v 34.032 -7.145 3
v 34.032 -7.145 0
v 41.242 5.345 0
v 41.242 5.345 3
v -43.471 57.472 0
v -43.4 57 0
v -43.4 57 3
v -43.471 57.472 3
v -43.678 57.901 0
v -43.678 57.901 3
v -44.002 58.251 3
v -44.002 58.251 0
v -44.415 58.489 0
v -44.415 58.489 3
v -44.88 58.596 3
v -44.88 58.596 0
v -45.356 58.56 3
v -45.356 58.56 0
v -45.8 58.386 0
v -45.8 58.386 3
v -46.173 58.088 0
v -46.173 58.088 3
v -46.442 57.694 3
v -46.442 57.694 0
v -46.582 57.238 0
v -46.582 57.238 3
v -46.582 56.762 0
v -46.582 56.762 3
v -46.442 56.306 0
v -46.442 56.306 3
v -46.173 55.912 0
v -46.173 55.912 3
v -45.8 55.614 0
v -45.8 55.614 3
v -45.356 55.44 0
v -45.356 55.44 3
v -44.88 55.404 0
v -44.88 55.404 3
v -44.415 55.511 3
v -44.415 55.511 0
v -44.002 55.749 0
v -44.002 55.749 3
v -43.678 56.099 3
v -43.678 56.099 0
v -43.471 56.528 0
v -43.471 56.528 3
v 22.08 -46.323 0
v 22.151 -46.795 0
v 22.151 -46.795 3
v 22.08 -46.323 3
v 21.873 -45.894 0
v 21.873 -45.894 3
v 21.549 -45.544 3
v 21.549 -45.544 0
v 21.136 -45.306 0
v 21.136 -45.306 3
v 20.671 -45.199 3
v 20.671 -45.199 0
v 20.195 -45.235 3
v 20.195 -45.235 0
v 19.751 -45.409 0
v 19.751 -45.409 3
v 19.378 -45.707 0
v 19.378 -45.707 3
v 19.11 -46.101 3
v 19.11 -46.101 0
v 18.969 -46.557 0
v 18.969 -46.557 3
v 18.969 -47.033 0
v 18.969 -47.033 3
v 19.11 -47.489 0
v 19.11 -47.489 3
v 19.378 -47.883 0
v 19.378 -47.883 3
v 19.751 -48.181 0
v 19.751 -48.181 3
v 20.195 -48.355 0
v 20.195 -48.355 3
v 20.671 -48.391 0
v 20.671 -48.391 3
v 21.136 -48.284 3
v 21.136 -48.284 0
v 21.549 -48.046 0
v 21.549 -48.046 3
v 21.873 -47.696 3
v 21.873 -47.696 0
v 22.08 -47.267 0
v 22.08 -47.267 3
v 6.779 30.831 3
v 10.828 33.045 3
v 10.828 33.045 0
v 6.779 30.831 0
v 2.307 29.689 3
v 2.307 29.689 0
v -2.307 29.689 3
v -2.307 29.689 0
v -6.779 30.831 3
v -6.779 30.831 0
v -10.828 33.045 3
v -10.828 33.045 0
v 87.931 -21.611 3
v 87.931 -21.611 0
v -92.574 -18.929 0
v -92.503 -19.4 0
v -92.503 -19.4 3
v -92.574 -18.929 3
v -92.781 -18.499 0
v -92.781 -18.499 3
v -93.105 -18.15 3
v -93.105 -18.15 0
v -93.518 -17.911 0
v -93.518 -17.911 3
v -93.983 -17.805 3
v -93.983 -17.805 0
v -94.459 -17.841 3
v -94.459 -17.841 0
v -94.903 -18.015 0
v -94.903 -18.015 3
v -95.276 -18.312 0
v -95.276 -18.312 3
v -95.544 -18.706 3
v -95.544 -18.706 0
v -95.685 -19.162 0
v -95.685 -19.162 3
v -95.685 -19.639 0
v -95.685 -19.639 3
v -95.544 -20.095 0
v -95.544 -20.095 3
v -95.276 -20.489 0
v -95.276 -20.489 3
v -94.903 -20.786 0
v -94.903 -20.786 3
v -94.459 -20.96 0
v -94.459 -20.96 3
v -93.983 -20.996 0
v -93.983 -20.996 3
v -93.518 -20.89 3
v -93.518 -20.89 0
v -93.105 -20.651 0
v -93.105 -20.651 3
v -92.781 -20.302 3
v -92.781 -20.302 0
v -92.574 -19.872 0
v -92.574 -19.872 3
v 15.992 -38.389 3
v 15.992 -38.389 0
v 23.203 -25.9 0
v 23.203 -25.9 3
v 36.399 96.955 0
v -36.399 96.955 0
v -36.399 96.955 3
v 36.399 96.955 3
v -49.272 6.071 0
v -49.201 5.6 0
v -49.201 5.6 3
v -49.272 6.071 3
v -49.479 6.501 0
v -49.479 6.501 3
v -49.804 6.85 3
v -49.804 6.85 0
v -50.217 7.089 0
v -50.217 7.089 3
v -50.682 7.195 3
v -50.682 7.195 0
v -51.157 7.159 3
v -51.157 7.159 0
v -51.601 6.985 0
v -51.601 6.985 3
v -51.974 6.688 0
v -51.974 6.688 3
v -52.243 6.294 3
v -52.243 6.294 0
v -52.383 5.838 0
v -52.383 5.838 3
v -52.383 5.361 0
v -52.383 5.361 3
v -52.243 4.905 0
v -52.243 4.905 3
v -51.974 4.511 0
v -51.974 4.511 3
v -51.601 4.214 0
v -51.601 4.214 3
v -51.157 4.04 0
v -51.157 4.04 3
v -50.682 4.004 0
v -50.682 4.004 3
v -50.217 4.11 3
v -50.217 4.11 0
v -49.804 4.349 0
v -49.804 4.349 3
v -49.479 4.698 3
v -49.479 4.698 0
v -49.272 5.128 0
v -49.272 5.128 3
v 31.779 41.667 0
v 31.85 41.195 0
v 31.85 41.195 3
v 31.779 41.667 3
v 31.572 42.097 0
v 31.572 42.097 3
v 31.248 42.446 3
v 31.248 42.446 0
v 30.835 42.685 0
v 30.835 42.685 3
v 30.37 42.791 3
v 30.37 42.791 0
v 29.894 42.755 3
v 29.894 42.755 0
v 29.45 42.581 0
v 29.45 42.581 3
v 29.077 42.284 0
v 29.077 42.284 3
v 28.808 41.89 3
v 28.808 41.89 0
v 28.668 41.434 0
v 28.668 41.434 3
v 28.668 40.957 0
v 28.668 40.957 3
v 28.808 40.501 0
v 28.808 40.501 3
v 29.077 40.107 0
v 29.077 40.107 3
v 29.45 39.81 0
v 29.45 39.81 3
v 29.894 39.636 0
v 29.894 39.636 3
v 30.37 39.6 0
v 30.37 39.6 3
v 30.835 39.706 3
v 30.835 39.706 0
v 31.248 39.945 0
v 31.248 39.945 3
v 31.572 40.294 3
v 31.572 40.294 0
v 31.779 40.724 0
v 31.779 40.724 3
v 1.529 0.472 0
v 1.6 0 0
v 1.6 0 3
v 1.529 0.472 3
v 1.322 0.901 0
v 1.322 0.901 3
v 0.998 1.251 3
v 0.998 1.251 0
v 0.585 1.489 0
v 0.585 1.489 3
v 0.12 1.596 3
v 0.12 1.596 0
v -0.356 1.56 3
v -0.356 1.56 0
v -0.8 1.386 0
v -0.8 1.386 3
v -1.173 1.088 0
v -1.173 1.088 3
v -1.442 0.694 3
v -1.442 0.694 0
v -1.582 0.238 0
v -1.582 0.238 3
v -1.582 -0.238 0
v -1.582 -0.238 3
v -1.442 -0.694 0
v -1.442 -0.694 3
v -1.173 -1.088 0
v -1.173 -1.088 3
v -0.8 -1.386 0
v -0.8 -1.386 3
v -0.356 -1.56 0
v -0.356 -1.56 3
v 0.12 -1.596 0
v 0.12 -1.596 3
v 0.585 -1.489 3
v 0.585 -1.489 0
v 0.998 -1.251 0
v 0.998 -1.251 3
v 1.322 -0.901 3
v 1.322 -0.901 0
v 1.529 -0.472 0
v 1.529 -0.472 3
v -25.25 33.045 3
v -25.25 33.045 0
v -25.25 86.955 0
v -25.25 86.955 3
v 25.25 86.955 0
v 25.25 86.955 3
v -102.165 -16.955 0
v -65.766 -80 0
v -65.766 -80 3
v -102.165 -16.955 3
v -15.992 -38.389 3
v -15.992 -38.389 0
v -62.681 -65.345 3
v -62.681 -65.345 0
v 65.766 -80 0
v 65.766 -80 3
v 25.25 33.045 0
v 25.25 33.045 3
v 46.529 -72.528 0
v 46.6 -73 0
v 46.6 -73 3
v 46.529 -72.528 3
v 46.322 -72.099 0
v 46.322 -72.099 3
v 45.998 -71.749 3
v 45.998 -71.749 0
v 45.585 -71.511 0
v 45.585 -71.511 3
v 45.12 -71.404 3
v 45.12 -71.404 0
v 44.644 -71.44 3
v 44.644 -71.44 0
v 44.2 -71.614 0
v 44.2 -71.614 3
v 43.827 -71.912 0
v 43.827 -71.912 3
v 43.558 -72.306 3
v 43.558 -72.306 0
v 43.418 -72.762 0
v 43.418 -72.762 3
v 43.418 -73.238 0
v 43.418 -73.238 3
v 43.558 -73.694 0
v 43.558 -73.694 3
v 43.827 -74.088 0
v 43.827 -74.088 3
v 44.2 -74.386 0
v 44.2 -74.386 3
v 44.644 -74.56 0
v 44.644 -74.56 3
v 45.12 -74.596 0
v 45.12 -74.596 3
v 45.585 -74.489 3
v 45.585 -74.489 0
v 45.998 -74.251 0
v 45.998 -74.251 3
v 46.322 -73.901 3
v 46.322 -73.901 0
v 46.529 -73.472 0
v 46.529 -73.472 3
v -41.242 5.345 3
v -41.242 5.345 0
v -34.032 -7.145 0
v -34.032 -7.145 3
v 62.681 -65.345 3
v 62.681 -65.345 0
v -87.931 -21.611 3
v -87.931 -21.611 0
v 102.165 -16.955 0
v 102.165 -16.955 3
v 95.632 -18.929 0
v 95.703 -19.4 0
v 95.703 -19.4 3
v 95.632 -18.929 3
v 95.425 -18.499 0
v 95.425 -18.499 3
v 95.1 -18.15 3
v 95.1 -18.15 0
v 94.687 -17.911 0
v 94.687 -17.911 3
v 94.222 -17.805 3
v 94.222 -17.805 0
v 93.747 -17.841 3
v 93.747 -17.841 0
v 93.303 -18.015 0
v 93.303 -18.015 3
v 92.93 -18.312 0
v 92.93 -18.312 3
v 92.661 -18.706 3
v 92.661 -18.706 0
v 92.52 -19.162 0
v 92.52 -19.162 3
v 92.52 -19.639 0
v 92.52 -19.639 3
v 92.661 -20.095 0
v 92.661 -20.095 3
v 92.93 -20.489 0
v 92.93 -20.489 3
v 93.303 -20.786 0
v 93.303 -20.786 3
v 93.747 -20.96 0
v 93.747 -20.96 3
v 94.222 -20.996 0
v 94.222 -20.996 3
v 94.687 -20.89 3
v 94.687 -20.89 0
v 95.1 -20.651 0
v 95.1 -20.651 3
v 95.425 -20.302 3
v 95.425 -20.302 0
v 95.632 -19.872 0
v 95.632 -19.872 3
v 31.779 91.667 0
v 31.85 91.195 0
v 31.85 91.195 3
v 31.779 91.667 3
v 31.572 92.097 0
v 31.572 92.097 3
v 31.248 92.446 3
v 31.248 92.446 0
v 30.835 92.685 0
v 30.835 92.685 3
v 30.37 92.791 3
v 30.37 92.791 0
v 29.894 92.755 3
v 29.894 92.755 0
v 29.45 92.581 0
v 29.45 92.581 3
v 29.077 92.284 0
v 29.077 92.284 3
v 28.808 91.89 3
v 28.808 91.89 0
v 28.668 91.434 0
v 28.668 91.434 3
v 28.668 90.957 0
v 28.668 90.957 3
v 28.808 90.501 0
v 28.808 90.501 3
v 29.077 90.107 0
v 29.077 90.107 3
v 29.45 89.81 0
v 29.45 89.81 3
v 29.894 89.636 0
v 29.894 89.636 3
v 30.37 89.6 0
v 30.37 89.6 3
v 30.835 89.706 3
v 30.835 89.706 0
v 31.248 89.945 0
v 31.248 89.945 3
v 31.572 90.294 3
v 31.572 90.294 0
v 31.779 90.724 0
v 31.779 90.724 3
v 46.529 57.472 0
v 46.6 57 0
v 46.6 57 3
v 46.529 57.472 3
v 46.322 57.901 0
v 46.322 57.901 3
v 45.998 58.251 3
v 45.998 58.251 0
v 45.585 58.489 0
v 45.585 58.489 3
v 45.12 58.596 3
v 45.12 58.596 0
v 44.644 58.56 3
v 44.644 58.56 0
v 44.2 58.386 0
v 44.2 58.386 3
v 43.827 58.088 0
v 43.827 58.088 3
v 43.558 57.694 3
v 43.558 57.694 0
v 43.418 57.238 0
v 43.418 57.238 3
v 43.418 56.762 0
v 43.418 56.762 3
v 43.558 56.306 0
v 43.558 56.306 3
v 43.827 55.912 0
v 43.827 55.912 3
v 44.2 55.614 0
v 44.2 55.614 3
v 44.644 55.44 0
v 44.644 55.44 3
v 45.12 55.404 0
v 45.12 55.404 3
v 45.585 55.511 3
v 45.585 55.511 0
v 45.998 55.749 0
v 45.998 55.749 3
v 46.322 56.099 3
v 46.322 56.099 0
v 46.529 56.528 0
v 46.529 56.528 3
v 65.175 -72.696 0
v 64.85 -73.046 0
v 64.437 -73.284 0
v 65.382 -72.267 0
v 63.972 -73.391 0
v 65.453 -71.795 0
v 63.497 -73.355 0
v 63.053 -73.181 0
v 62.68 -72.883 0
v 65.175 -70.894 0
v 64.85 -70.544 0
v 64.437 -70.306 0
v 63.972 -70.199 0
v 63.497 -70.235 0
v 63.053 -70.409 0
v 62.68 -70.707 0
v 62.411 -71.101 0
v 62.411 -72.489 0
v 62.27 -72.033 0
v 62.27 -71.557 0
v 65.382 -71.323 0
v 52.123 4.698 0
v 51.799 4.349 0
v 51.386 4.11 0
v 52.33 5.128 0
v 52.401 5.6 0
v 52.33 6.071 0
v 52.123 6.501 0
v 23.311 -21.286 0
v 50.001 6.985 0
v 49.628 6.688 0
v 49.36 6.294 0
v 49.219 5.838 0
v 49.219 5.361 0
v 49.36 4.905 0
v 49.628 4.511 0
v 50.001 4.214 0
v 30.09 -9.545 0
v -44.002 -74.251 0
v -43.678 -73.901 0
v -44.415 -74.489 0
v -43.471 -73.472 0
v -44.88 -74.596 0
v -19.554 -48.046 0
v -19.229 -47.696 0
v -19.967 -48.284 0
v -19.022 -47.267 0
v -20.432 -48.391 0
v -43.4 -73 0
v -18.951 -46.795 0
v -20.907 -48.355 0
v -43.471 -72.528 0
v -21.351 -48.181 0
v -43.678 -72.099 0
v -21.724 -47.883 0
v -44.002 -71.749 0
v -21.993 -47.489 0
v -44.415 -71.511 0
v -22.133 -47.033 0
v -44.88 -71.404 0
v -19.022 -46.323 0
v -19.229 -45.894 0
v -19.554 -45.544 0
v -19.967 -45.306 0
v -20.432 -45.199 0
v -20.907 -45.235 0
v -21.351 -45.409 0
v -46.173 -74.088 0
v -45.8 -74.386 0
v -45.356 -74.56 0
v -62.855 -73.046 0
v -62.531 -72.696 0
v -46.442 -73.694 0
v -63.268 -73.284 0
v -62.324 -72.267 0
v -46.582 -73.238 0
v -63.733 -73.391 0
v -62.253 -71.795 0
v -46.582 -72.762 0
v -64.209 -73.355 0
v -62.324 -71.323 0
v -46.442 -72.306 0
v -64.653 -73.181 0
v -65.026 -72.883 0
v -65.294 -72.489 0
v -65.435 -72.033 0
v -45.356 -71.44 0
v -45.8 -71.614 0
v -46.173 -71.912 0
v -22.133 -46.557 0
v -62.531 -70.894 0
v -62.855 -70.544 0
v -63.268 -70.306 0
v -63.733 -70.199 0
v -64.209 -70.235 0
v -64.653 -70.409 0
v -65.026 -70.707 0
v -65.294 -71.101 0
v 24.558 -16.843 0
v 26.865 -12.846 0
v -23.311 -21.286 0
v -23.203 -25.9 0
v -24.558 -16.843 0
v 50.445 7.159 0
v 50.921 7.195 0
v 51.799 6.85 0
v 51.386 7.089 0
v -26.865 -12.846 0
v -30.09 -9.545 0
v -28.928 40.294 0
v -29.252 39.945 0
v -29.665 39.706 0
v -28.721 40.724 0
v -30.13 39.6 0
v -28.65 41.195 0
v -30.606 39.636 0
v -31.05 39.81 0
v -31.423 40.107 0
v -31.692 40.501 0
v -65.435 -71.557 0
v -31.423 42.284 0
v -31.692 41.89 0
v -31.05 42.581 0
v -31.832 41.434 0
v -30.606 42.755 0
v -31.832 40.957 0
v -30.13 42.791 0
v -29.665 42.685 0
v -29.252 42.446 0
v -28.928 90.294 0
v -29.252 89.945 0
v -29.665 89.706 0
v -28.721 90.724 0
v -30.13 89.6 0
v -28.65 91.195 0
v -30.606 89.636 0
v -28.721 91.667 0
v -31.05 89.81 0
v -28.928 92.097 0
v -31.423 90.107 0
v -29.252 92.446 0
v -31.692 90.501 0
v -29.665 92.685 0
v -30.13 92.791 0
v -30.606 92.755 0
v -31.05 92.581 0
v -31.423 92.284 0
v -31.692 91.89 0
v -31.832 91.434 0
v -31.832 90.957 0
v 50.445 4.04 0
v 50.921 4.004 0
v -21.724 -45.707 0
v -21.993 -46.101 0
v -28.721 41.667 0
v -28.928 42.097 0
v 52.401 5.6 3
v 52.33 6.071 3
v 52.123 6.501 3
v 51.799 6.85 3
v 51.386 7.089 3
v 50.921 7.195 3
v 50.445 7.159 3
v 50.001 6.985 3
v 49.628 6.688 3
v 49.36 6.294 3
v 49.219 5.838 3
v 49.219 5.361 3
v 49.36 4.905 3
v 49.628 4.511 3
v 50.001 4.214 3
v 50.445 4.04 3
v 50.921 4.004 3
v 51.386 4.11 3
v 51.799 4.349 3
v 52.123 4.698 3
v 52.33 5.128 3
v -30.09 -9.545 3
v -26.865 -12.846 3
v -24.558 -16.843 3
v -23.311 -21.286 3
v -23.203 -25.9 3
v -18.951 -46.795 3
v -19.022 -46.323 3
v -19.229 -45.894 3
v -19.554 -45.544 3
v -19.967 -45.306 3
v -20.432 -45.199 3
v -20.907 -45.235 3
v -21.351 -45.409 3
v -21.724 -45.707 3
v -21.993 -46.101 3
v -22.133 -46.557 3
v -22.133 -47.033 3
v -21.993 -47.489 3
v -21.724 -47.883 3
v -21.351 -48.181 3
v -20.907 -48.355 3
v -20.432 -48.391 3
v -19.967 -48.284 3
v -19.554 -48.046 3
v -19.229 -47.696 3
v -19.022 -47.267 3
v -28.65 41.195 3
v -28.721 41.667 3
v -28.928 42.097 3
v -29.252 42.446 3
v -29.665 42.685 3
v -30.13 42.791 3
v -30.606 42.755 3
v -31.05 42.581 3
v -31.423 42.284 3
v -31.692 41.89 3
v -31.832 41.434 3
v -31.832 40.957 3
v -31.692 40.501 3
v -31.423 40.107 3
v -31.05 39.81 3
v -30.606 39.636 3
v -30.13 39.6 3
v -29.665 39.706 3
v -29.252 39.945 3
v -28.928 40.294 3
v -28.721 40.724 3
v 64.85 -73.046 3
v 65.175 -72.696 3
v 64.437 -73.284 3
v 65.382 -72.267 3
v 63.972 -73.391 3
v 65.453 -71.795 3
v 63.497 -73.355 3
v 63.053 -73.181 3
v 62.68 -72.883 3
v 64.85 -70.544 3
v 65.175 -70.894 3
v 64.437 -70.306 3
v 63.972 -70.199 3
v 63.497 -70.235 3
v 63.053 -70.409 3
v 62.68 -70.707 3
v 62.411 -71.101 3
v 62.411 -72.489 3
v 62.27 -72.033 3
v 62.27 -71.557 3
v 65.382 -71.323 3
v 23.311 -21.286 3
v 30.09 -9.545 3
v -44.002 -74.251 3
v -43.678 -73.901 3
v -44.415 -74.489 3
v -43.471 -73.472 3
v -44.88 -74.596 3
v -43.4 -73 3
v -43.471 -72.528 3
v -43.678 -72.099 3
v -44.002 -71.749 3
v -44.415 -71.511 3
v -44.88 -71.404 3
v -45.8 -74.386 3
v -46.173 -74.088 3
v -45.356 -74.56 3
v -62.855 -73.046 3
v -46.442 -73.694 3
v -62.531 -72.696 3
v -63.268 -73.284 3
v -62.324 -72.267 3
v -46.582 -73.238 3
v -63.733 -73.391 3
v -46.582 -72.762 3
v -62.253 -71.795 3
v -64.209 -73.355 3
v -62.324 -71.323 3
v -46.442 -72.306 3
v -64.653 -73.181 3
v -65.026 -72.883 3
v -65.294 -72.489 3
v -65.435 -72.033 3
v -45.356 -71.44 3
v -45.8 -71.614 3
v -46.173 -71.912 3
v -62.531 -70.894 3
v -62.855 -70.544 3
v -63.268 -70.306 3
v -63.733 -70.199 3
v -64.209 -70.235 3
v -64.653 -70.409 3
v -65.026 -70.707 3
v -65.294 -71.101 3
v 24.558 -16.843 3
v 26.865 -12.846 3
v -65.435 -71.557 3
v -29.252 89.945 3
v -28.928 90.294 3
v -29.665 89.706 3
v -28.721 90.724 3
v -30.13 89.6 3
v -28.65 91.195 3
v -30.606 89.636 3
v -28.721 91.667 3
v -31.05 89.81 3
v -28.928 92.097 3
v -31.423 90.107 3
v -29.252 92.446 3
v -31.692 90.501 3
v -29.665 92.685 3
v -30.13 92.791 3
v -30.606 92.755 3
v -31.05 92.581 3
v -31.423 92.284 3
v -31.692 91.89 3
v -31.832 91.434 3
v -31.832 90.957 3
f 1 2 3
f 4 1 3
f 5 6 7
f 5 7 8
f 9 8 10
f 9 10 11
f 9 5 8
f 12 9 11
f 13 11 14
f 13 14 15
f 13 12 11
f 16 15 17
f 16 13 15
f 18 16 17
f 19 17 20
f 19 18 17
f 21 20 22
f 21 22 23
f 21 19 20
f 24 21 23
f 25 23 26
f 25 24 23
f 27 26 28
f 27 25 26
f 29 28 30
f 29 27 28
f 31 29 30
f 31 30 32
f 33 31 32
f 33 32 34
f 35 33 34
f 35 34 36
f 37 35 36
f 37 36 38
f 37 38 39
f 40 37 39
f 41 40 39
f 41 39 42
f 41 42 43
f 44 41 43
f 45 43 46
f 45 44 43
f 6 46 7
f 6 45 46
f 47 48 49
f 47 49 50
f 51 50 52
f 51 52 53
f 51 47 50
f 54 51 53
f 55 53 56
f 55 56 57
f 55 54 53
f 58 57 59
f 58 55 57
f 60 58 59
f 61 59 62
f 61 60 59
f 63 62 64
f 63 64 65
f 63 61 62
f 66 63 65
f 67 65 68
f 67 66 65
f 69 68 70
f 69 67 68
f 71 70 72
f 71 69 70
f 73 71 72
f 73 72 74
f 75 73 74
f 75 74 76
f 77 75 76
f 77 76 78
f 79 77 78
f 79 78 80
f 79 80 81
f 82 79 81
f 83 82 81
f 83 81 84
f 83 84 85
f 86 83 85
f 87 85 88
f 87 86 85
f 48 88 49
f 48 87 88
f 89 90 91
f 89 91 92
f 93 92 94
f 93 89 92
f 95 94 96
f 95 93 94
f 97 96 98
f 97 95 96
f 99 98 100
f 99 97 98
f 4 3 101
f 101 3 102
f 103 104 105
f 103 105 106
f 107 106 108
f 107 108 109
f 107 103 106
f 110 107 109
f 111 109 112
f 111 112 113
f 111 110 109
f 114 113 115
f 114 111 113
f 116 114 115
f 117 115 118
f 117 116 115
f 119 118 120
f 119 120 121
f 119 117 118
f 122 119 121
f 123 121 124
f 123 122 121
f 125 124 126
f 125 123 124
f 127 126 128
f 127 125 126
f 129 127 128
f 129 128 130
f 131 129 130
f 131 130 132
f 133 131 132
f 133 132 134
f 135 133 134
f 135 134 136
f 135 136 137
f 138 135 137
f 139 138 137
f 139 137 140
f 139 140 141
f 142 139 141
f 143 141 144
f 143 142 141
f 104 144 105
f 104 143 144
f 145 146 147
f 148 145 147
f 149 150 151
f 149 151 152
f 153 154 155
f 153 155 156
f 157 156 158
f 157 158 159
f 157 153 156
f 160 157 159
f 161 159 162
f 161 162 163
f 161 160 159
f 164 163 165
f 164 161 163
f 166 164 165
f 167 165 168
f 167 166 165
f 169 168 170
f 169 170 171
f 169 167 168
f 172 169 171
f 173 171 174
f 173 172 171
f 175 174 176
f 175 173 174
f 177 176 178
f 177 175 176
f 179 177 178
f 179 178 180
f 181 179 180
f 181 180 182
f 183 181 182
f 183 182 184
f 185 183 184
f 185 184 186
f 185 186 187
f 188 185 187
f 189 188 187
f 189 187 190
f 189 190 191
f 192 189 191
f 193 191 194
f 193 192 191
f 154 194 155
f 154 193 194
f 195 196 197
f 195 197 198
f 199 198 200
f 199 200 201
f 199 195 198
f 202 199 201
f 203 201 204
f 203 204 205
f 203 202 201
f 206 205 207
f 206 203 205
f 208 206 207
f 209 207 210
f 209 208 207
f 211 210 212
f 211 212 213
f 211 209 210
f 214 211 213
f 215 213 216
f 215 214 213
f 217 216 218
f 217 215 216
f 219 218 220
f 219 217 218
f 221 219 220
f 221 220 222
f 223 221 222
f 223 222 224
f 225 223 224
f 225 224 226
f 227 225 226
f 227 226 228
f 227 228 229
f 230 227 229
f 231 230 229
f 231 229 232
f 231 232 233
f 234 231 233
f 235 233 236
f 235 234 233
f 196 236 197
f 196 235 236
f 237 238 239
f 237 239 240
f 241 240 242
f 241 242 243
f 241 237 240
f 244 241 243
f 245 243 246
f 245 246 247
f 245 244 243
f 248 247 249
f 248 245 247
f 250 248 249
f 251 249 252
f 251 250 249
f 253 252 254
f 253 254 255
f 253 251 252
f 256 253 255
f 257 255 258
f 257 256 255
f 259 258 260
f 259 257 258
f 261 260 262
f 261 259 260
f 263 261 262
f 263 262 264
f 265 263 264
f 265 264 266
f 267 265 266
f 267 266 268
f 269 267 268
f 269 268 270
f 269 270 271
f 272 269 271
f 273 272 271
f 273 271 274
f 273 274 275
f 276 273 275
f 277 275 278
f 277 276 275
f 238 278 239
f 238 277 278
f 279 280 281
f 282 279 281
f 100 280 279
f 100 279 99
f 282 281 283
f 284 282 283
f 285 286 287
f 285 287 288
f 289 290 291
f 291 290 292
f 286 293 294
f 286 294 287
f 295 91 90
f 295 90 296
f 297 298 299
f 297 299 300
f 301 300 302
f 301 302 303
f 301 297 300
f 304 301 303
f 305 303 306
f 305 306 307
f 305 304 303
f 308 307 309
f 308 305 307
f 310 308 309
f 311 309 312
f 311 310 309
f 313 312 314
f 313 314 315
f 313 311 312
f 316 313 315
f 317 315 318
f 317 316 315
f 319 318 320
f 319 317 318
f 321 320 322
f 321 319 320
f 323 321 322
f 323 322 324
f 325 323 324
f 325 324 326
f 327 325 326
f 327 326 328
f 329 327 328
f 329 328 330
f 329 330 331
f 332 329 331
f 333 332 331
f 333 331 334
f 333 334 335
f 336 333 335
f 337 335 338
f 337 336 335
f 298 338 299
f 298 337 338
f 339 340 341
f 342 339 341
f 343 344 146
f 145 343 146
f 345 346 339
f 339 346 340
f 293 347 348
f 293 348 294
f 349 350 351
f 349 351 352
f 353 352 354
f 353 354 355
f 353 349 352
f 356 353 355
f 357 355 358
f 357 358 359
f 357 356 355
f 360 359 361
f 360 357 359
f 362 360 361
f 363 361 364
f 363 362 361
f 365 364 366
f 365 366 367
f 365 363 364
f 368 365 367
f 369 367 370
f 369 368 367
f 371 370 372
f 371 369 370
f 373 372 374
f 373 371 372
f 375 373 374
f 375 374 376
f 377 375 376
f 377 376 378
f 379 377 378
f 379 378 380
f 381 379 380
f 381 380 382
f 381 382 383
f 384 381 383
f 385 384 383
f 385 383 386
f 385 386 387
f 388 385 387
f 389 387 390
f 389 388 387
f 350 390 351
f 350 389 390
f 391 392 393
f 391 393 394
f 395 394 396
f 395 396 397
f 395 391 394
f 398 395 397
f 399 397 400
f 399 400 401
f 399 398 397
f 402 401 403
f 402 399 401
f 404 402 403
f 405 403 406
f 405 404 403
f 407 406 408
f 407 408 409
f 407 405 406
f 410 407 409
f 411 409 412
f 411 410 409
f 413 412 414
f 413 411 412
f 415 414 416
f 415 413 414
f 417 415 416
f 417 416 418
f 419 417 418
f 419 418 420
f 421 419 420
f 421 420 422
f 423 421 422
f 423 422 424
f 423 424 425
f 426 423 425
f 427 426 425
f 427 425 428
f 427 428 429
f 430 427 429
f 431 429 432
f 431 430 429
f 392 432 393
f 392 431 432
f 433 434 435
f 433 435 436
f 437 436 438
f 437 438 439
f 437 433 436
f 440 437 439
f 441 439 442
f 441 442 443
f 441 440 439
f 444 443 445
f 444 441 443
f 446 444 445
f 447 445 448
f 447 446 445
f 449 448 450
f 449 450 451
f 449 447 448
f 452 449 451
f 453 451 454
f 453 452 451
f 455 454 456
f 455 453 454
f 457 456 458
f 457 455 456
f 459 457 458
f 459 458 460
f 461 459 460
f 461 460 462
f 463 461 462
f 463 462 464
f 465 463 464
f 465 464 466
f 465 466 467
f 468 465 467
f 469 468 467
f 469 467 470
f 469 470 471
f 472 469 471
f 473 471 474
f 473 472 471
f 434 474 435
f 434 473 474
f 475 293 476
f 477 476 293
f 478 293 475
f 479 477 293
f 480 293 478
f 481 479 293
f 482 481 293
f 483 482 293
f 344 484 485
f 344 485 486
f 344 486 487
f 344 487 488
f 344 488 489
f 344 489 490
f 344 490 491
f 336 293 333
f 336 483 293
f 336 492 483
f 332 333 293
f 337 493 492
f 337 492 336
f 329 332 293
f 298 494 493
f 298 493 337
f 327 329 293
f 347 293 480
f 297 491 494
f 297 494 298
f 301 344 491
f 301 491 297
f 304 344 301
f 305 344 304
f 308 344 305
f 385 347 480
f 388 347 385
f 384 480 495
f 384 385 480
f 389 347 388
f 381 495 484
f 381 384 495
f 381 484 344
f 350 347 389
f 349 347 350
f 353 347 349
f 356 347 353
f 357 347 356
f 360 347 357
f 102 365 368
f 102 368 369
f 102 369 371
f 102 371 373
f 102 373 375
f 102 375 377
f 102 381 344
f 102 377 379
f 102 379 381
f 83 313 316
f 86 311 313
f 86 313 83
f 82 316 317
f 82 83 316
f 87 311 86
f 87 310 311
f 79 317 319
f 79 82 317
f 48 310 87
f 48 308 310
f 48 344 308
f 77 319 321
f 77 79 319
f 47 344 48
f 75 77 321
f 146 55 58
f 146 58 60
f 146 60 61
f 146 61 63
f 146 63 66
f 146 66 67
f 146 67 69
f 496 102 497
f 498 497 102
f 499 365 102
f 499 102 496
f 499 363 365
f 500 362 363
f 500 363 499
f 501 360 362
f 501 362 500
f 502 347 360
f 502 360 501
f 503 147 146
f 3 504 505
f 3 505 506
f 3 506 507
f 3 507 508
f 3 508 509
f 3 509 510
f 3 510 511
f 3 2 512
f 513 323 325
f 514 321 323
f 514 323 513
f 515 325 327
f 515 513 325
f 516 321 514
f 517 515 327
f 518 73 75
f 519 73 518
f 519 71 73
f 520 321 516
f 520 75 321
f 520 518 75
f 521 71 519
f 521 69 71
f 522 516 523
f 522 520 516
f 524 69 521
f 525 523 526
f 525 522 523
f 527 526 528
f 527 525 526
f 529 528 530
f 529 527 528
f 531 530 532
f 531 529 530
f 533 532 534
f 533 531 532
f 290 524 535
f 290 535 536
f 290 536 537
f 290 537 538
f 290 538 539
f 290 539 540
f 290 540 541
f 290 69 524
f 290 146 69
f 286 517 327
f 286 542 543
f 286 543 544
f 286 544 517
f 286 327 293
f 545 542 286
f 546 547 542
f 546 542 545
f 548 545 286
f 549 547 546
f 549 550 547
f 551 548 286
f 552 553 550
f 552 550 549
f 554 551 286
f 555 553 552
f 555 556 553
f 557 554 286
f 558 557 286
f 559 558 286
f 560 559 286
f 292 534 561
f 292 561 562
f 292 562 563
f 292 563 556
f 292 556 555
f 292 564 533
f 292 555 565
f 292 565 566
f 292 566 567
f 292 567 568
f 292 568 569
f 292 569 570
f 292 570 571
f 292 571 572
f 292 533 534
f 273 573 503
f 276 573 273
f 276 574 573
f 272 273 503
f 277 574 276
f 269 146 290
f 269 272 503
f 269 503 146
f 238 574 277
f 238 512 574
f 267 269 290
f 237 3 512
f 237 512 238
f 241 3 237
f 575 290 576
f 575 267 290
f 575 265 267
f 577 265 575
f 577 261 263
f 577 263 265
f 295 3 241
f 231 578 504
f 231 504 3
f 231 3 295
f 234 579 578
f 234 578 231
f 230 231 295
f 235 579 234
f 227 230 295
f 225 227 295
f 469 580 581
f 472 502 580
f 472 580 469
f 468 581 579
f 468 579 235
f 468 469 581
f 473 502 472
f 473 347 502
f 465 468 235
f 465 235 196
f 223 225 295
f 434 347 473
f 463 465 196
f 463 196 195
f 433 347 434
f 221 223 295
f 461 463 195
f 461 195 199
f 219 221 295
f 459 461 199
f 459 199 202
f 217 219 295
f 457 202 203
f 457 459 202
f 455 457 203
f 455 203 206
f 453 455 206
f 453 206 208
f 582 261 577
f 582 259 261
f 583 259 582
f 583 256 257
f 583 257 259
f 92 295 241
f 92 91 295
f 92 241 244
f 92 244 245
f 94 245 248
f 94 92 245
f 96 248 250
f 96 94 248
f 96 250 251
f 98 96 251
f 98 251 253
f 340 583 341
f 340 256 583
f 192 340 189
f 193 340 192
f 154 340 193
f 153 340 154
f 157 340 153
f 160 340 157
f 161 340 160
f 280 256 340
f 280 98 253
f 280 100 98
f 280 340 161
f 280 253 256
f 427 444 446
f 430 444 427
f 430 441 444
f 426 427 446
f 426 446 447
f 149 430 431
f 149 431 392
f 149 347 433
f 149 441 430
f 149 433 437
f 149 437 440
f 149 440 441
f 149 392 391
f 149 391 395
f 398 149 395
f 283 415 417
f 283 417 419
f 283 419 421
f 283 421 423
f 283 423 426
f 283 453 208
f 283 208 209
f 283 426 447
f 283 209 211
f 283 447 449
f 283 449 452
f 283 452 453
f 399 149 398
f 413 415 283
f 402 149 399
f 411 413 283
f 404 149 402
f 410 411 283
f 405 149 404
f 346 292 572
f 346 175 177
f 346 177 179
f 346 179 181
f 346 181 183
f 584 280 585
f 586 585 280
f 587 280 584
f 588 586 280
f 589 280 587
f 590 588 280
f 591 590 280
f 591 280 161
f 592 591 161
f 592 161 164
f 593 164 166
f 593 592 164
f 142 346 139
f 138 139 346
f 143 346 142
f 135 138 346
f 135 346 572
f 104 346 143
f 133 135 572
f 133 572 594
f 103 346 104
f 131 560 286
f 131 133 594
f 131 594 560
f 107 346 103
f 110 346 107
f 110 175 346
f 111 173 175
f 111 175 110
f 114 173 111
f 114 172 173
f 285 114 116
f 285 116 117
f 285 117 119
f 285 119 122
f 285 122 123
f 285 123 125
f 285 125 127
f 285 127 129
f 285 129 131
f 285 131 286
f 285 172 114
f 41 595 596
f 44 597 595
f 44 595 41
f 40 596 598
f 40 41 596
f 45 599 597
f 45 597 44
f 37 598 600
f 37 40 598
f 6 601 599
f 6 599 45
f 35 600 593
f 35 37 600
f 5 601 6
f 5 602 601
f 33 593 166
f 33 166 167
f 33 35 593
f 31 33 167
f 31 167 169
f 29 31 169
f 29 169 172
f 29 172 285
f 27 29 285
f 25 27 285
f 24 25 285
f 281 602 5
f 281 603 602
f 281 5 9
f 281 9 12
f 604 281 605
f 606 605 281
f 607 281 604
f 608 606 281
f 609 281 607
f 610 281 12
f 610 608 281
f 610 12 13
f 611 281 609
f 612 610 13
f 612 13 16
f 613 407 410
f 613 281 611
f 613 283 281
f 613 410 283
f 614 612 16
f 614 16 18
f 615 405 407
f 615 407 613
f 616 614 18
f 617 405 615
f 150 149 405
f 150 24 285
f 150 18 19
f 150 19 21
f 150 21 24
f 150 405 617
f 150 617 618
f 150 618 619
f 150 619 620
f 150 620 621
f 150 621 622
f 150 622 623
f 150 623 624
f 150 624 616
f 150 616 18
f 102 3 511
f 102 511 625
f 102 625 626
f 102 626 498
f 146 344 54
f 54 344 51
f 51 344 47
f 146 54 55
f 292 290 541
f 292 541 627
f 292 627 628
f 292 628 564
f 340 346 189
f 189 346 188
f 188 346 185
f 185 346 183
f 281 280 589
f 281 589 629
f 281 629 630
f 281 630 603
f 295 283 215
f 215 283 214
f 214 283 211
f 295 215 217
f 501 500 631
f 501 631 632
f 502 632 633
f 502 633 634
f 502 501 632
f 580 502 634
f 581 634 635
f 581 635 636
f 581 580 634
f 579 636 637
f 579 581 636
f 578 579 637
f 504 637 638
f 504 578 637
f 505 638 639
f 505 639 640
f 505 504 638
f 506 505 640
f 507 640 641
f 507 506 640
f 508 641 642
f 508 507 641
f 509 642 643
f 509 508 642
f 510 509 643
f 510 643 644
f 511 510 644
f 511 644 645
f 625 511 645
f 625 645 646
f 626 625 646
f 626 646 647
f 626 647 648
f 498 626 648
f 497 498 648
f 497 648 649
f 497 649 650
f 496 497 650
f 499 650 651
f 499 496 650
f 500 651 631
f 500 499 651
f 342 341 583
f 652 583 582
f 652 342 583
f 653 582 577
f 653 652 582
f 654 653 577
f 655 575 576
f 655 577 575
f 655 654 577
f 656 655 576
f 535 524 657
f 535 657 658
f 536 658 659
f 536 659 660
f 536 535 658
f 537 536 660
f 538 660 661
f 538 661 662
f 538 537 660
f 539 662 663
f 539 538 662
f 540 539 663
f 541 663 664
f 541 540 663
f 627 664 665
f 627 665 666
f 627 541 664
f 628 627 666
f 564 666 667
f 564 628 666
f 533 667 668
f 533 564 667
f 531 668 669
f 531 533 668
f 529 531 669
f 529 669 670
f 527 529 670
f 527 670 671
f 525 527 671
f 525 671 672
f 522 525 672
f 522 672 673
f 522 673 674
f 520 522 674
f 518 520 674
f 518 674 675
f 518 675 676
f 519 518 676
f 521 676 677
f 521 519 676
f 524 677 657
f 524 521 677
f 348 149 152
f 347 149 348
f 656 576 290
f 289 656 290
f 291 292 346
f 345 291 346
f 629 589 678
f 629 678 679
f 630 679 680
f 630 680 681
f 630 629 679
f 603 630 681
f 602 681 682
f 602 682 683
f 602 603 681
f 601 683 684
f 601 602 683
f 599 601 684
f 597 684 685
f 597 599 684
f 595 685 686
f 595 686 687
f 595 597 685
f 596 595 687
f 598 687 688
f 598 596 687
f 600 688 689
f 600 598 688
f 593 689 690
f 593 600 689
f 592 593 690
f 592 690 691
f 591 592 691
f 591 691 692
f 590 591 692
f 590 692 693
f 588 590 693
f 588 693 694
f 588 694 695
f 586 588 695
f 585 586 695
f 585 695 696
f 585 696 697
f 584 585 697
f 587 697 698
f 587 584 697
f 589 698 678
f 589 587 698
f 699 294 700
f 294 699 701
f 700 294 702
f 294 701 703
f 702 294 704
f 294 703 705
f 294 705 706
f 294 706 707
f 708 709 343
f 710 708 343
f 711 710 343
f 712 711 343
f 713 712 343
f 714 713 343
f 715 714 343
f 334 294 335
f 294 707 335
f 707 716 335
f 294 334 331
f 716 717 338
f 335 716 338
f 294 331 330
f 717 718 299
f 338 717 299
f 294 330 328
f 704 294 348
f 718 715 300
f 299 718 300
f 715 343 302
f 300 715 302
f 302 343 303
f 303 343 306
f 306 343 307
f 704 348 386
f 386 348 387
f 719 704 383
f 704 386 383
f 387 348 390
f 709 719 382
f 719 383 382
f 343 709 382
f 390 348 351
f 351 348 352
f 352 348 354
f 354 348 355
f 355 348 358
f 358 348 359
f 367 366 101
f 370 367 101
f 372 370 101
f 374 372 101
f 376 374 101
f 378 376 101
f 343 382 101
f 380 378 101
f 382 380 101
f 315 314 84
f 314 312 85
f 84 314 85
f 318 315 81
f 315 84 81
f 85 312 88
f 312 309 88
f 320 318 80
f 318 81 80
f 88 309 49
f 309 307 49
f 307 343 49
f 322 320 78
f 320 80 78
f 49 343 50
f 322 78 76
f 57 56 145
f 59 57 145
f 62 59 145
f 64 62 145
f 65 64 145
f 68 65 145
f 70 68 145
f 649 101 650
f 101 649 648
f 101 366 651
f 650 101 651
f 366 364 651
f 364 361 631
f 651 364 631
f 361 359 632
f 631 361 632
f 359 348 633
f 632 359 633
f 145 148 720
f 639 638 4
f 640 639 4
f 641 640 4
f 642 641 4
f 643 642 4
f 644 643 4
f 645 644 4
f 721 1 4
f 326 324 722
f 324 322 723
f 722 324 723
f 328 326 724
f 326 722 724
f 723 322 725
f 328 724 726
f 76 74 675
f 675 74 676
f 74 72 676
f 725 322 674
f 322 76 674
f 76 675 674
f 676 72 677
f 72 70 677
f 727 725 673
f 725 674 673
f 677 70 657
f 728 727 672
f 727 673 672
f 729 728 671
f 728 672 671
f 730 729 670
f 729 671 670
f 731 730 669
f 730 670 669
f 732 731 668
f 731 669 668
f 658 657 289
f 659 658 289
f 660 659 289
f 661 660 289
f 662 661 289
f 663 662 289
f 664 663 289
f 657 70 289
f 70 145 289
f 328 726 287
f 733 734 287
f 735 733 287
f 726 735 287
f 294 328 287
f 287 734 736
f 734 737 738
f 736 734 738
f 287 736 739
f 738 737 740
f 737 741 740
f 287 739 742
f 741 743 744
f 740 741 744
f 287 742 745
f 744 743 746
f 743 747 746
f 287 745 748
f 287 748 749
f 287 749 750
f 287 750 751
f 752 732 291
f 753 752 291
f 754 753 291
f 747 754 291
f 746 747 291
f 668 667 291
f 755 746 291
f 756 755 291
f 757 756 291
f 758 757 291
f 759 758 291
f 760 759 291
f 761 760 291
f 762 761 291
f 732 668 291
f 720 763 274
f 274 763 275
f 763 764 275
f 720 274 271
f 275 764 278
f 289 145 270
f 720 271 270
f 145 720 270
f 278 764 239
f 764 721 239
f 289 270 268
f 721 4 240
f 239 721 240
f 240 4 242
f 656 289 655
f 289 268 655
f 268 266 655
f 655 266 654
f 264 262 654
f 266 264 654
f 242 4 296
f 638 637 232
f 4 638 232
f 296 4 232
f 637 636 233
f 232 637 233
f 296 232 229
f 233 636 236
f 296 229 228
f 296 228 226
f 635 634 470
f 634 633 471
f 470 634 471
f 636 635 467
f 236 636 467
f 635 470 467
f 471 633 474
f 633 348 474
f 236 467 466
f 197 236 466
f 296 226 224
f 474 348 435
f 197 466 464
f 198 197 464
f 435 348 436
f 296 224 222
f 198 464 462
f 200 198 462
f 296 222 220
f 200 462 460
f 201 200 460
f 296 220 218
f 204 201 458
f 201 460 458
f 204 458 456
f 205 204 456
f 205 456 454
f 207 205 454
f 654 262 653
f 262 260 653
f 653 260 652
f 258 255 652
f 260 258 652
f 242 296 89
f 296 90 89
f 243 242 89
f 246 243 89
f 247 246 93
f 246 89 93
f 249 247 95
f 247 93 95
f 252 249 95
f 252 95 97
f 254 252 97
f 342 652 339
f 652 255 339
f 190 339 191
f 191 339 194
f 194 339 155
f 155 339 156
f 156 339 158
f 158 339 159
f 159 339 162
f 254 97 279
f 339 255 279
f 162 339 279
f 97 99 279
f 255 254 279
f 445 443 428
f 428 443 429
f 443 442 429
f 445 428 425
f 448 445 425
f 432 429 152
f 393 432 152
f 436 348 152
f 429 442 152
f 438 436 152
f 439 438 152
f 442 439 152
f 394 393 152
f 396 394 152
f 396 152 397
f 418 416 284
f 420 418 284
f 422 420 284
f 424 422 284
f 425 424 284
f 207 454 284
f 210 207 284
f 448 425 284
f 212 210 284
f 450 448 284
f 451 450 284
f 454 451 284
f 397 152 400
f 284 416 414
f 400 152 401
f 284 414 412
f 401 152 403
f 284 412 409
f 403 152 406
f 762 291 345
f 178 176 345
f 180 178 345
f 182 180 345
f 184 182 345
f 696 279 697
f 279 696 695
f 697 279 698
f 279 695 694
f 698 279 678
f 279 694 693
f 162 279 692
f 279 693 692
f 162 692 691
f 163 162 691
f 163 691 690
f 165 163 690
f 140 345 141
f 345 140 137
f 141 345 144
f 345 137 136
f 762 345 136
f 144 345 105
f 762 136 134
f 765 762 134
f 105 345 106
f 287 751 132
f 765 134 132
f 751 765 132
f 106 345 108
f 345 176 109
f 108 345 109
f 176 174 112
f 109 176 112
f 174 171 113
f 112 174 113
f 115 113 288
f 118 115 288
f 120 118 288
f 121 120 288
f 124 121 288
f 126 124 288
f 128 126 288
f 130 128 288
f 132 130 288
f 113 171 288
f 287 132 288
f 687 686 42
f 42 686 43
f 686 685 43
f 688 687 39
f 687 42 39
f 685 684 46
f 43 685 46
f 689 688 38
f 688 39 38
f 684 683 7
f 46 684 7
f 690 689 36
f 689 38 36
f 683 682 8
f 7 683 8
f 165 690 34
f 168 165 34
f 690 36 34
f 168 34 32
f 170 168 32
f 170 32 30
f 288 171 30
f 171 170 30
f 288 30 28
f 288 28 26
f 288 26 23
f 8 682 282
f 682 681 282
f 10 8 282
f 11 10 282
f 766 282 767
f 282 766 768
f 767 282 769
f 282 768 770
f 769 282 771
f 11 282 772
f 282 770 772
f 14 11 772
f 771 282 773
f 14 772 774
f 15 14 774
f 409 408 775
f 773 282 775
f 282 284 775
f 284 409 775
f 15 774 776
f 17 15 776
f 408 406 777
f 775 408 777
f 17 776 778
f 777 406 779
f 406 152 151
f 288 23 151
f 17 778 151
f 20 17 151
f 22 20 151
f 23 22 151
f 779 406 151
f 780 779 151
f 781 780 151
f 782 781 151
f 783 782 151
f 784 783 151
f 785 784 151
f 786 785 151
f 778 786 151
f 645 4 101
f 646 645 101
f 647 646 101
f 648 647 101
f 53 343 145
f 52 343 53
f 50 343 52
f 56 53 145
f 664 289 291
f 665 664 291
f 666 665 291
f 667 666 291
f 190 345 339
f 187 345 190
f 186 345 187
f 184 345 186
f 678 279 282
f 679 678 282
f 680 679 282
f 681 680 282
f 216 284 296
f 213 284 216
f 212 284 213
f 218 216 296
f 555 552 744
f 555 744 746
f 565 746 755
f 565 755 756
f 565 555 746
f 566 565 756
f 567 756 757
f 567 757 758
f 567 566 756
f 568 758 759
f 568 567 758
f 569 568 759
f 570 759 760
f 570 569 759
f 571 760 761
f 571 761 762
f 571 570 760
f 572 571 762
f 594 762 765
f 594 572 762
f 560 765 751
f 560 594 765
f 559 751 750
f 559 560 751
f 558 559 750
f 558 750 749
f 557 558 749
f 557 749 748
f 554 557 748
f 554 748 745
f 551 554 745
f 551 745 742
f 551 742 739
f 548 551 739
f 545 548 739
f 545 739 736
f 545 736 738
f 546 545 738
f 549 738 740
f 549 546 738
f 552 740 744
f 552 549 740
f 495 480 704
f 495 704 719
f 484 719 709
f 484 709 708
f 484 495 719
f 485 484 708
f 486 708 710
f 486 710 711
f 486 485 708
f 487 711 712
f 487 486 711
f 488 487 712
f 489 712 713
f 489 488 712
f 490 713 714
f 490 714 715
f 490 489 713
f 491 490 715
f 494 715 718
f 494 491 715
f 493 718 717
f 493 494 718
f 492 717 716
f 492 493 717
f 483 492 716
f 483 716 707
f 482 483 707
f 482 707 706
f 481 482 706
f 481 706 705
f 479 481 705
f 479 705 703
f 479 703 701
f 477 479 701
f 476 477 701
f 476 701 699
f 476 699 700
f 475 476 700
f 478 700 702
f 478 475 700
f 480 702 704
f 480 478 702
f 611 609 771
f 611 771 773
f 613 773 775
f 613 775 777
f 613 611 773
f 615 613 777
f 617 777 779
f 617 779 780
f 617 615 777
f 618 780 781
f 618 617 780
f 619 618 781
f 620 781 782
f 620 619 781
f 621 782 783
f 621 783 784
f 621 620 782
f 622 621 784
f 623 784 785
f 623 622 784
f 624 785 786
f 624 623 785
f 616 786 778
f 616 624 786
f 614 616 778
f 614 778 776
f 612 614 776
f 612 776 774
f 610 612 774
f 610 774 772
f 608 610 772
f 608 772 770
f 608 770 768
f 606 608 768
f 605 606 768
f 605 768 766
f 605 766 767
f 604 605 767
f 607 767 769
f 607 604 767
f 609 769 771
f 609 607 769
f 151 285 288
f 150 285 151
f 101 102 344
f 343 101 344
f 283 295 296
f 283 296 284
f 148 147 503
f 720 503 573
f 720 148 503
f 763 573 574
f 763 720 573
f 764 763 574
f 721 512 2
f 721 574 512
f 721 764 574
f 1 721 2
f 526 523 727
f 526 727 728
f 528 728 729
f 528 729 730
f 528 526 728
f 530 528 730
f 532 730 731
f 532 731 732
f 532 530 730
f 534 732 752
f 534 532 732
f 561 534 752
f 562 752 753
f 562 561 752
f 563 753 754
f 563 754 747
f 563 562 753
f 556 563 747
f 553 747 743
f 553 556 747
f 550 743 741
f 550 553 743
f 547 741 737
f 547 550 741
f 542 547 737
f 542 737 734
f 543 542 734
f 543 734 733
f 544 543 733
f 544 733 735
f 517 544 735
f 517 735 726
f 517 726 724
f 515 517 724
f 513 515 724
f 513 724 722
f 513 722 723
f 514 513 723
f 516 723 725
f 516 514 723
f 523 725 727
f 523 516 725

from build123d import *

# Parameters (mm, degrees)
SKETCH_1_R          = 1.6
SKETCH_1_W          = 50.5
SKETCH_1_H          = 53.910884284
EXTRUDE_1_DEPTH     = 3
CUT_EXTRUDE_1_DEPTH = 4


with BuildPart() as part:
    # ｽｹｯﾁ1 → ﾎﾞｽ - 押し出し1 (new body)
    with BuildSketch(Plane.XY):
        Polygon((-36.39879245, 96.955442142), (36.39879245, 96.955442142), (102.165272155, -16.955442142), (65.766479705, -80), (-65.766479705, -80), (-102.165272155, -16.955442142), align=None)
        with Locations((30.25, 91.195498156)):
            Circle(SKETCH_1_R, mode=Mode.SUBTRACT)
        with Locations((30.25, 41.195498156)):
            Circle(SKETCH_1_R, mode=Mode.SUBTRACT)
        with Locations((-30.25, 41.195498156)):
            Circle(SKETCH_1_R, mode=Mode.SUBTRACT)
        with Locations((-30.25, 91.195498156)):
            Circle(SKETCH_1_R, mode=Mode.SUBTRACT)
        with Locations((63.852618114, -71.795017542)):
            Circle(SKETCH_1_R, mode=Mode.SUBTRACT)
        with Locations((94.102618114, -19.400480613)):
            Circle(SKETCH_1_R, mode=Mode.SUBTRACT)
        with Locations((50.801347925, 5.599519387)):
            Circle(SKETCH_1_R, mode=Mode.SUBTRACT)
        with Locations((20.551347925, -46.795017542)):
            Circle(SKETCH_1_R, mode=Mode.SUBTRACT)
        with Locations((-94.102618114, -19.400480613)):
            Circle(SKETCH_1_R, mode=Mode.SUBTRACT)
        with Locations((-63.852618114, -71.795017542)):
            Circle(SKETCH_1_R, mode=Mode.SUBTRACT)
        with Locations((-20.551347925, -46.795017542)):
            Circle(SKETCH_1_R, mode=Mode.SUBTRACT)
        with Locations((-50.801347925, 5.599519387)):
            Circle(SKETCH_1_R, mode=Mode.SUBTRACT)
        with Locations((-45, 57)):
            Circle(SKETCH_1_R, mode=Mode.SUBTRACT)
        with Locations((45, 57)):
            Circle(SKETCH_1_R, mode=Mode.SUBTRACT)
        with Locations((45, -73)):
            Circle(SKETCH_1_R, mode=Mode.SUBTRACT)
        with Locations((-45, -73)):
            Circle(SKETCH_1_R, mode=Mode.SUBTRACT)
        Circle(SKETCH_1_R, mode=Mode.SUBTRACT)
        with Locations((0, 60)):
            Rectangle(SKETCH_1_W, SKETCH_1_H, mode=Mode.SUBTRACT)
        Polygon((87.930621892, -21.610579625), (62.680621892, -65.344862517), (15.992426562, -38.389420375), (41.242426562, 5.344862517), align=None, mode=Mode.SUBTRACT)
        Polygon((-62.680621892, -65.344862517), (-87.930621892, -21.610579625), (-41.242426562, 5.344862517), (-15.992426562, -38.389420375), align=None, mode=Mode.SUBTRACT)
    extrude(amount=EXTRUDE_1_DEPTH)

    # ｽｹｯﾁ2 → ｶｯﾄ - 押し出し1 (cut, through all)
    with BuildSketch(Plane.XY.offset(3)):
        with BuildLine():
            Line((-10.828203914, 33.044557858), (10.828203914, 33.044557858))
            ThreePointArc((10.828203914, 33.044557858), (0, 29.544557858), (-10.828203914, 33.044557858))
        make_face()
        with BuildLine():
            Line((34.031528519, -7.144779262), (23.203324605, -25.899778596))
            ThreePointArc((23.203324605, -25.899778596), (25.586337649, -14.772278929), (34.031528519, -7.144779262))
        make_face()
        with BuildLine():
            Line((-23.203324605, -25.899778596), (-34.031528519, -7.144779262))
            ThreePointArc((-34.031528519, -7.144779262), (-25.586337649, -14.772278929), (-23.203324605, -25.899778596))
        make_face()
    extrude(amount=-CUT_EXTRUDE_1_DEPTH, mode=Mode.SUBTRACT)


solid = part.part
